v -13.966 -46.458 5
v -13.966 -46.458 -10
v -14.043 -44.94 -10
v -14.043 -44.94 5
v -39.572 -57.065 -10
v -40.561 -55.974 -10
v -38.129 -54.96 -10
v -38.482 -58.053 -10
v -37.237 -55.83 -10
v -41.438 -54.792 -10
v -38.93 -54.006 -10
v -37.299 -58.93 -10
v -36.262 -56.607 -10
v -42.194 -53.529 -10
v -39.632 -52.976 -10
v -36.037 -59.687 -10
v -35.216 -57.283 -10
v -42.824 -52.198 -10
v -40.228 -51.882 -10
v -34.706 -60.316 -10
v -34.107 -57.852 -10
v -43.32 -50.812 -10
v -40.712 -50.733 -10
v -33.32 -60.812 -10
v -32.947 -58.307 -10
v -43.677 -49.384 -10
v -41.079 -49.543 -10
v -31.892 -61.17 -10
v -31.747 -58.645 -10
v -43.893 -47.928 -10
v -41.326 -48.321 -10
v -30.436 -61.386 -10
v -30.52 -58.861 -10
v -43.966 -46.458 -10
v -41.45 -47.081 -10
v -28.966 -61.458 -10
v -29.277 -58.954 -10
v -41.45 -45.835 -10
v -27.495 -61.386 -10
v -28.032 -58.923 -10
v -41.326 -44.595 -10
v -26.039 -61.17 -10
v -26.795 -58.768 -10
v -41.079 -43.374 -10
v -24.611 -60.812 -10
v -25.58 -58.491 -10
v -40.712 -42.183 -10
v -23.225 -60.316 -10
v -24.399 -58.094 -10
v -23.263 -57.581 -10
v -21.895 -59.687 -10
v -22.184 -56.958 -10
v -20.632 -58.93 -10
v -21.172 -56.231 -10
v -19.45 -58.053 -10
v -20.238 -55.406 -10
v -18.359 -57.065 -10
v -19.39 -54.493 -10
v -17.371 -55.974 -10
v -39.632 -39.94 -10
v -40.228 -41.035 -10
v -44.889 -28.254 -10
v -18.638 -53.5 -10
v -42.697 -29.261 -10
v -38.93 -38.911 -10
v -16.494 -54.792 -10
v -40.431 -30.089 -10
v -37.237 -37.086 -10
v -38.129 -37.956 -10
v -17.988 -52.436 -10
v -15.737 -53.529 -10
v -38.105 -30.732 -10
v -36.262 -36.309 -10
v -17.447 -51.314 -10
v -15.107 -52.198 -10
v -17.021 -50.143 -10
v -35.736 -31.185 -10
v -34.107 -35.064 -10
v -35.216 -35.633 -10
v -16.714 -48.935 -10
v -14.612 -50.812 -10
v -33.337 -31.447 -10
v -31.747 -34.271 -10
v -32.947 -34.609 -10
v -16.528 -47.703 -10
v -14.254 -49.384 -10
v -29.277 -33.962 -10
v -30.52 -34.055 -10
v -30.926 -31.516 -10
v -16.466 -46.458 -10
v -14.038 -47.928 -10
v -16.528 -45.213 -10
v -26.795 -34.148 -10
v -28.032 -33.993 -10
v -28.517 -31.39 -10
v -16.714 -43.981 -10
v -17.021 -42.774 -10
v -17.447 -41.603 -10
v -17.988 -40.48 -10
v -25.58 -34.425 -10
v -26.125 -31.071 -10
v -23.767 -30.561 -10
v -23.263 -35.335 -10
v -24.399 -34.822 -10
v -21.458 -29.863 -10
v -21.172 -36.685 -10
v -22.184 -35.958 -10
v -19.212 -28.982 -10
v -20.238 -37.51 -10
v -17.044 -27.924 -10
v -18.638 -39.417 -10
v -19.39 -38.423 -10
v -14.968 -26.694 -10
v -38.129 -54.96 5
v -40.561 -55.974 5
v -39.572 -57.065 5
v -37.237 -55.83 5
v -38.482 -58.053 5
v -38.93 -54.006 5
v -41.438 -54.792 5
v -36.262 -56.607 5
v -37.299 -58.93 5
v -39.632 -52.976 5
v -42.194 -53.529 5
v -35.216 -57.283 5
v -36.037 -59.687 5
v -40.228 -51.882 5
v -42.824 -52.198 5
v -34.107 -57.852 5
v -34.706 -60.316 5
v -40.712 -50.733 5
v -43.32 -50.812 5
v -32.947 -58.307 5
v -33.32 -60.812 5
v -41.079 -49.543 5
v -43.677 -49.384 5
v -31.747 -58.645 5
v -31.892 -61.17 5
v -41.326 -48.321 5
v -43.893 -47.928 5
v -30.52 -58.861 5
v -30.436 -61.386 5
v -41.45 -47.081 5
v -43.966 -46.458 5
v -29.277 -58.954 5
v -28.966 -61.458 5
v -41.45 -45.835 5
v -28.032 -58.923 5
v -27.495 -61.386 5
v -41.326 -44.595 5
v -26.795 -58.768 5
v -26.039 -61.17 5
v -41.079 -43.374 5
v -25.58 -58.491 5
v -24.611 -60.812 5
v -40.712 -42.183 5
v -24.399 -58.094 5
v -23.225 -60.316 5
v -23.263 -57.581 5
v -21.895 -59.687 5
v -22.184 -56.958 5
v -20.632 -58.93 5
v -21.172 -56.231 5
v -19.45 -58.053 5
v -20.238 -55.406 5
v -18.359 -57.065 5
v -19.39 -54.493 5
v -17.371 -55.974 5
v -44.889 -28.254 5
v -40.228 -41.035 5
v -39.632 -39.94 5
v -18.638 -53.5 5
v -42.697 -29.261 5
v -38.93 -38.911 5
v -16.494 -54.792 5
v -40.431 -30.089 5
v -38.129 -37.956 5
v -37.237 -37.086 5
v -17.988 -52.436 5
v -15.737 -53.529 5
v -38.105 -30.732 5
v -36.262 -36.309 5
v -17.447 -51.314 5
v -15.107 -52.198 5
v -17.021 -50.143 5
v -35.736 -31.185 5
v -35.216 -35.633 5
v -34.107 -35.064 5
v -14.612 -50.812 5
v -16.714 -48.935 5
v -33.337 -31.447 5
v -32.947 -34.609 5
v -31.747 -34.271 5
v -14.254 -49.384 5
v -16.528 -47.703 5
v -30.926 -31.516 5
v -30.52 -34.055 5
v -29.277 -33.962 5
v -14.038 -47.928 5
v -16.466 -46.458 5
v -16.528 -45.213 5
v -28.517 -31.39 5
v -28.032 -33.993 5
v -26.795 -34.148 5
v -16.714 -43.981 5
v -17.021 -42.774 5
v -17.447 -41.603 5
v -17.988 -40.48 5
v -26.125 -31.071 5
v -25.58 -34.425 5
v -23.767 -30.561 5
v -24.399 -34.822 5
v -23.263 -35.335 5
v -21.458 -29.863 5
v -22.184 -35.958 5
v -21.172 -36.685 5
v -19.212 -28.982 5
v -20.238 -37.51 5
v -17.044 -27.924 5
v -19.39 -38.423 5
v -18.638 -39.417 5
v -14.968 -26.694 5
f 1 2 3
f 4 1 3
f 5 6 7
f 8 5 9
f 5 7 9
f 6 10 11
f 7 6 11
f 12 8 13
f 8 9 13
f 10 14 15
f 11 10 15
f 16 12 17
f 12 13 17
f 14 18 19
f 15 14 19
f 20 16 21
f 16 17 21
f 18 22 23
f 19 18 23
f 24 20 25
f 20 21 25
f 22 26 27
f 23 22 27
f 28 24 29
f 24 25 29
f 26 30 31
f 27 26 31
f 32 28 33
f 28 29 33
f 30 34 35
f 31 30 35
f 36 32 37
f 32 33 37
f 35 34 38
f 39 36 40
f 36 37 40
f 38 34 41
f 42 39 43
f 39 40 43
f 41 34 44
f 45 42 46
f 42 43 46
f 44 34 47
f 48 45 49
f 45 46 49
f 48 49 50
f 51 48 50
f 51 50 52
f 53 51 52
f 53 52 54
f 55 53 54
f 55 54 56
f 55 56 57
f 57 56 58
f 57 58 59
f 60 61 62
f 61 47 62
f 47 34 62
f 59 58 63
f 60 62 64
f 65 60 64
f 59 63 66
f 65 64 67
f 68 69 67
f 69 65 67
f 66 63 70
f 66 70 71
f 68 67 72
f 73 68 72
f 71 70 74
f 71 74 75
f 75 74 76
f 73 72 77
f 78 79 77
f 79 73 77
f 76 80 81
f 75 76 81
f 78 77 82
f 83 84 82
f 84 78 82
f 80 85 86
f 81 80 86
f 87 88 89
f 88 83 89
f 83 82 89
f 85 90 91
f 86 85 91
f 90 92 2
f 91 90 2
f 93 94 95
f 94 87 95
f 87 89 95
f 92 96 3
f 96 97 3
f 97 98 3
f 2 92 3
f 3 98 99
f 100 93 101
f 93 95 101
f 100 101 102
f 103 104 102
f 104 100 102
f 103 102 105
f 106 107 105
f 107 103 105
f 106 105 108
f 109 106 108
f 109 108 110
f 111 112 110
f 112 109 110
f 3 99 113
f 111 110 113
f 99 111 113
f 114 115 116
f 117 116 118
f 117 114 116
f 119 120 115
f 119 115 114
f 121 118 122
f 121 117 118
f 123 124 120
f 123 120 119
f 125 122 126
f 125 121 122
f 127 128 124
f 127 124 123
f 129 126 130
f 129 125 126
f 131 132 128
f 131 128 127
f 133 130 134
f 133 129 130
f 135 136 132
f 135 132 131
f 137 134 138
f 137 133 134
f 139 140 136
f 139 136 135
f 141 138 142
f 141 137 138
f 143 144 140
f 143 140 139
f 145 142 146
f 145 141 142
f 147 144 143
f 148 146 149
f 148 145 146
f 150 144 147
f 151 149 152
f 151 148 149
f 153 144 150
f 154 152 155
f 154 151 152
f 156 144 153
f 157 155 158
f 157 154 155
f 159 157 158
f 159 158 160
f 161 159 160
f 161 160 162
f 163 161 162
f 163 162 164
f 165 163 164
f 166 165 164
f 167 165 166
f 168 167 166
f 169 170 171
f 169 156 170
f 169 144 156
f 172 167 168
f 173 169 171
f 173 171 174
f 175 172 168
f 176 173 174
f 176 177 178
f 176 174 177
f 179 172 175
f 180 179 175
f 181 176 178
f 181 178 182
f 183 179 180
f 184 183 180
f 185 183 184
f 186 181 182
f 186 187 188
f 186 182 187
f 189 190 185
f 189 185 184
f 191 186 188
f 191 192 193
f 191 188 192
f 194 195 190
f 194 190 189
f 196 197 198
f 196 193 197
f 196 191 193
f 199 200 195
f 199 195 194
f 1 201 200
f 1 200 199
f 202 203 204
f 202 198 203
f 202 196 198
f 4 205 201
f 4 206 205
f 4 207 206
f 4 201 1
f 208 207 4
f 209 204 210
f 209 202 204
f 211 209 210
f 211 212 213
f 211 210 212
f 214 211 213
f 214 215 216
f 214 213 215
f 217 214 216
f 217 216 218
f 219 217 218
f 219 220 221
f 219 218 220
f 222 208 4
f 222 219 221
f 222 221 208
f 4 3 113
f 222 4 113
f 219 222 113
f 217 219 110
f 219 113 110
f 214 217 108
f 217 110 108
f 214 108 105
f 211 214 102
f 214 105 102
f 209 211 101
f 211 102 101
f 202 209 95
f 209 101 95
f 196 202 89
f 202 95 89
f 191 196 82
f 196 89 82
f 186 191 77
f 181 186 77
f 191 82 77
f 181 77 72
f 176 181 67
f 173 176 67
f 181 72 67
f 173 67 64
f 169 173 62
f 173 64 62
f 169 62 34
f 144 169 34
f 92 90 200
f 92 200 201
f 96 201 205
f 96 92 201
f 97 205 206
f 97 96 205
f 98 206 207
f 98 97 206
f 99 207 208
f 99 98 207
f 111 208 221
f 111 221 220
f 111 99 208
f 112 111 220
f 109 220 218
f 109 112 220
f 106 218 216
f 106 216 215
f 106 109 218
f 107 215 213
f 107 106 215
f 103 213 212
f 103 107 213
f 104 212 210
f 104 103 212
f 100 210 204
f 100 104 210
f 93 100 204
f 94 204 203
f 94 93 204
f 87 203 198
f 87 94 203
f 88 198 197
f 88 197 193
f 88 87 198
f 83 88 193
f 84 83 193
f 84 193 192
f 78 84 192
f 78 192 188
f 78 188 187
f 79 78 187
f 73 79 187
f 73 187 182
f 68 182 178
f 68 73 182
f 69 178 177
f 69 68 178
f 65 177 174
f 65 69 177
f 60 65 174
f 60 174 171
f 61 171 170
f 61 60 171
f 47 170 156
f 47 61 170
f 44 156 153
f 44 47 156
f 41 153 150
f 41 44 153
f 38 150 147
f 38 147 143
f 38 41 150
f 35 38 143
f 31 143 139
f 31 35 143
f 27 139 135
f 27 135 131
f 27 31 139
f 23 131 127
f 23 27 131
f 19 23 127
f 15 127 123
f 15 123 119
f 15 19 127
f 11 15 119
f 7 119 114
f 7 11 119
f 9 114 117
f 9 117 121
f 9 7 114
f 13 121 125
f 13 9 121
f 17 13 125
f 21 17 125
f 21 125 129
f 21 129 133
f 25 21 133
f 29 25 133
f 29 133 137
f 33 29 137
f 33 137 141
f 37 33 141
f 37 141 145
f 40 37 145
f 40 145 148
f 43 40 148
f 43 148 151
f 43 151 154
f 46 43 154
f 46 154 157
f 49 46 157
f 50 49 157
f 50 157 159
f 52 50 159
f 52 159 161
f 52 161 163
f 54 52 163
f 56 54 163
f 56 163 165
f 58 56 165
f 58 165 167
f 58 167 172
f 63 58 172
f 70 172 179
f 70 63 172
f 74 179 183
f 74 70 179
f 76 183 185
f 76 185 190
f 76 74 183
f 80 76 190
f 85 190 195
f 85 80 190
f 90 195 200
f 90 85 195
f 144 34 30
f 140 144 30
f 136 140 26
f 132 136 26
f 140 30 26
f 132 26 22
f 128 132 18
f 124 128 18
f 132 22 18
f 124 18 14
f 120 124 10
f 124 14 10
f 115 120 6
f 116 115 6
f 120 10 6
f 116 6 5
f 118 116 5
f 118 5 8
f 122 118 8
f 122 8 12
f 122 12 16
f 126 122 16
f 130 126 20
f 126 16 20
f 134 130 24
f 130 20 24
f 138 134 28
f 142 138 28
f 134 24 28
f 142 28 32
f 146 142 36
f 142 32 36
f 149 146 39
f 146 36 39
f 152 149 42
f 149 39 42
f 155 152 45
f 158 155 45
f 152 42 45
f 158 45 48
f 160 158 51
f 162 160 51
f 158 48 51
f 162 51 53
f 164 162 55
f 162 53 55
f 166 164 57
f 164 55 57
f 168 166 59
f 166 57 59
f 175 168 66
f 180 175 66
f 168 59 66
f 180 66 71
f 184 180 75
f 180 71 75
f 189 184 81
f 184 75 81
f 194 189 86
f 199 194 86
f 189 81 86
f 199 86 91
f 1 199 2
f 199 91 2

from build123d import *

# Parameters (mm, degrees)
BOSS_EXTRUDE1_DEPTH      = 5
BOSS_EXTRUDE1_DEPTH_BACK = 10
SKETCH1_R                = 12.5


with BuildPart() as part:
    # Sketch1 → Boss-Extrude1 (new, two sides: drawn at the far end of the back side and taken through both)
    with BuildSketch(Plane.XY.offset(-BOSS_EXTRUDE1_DEPTH_BACK)):
        with BuildLine():
            Line((-44.88915592, -28.254421038), (-43.965658713, -46.45807859))
            ThreePointArc((-43.965658713, -46.45807859), (-28.965658713, -61.45807859), (-13.965658713, -46.45807859))
            Line((-13.965658713, -46.45807859), (-14.042670787, -44.940043234))
            Line((-14.042670787, -44.940043234), (-14.968304337, -26.694274815))
            ThreePointArc((-14.968304337, -26.694274815), (-29.72001982, -31.477043366), (-44.88915592, -28.254421038))
        make_face()
        with Locations((-28.965658713, -46.45807859)):
            Circle(SKETCH1_R, mode=Mode.SUBTRACT)
    extrude(amount=BOSS_EXTRUDE1_DEPTH + BOSS_EXTRUDE1_DEPTH_BACK)


solid = part.part
